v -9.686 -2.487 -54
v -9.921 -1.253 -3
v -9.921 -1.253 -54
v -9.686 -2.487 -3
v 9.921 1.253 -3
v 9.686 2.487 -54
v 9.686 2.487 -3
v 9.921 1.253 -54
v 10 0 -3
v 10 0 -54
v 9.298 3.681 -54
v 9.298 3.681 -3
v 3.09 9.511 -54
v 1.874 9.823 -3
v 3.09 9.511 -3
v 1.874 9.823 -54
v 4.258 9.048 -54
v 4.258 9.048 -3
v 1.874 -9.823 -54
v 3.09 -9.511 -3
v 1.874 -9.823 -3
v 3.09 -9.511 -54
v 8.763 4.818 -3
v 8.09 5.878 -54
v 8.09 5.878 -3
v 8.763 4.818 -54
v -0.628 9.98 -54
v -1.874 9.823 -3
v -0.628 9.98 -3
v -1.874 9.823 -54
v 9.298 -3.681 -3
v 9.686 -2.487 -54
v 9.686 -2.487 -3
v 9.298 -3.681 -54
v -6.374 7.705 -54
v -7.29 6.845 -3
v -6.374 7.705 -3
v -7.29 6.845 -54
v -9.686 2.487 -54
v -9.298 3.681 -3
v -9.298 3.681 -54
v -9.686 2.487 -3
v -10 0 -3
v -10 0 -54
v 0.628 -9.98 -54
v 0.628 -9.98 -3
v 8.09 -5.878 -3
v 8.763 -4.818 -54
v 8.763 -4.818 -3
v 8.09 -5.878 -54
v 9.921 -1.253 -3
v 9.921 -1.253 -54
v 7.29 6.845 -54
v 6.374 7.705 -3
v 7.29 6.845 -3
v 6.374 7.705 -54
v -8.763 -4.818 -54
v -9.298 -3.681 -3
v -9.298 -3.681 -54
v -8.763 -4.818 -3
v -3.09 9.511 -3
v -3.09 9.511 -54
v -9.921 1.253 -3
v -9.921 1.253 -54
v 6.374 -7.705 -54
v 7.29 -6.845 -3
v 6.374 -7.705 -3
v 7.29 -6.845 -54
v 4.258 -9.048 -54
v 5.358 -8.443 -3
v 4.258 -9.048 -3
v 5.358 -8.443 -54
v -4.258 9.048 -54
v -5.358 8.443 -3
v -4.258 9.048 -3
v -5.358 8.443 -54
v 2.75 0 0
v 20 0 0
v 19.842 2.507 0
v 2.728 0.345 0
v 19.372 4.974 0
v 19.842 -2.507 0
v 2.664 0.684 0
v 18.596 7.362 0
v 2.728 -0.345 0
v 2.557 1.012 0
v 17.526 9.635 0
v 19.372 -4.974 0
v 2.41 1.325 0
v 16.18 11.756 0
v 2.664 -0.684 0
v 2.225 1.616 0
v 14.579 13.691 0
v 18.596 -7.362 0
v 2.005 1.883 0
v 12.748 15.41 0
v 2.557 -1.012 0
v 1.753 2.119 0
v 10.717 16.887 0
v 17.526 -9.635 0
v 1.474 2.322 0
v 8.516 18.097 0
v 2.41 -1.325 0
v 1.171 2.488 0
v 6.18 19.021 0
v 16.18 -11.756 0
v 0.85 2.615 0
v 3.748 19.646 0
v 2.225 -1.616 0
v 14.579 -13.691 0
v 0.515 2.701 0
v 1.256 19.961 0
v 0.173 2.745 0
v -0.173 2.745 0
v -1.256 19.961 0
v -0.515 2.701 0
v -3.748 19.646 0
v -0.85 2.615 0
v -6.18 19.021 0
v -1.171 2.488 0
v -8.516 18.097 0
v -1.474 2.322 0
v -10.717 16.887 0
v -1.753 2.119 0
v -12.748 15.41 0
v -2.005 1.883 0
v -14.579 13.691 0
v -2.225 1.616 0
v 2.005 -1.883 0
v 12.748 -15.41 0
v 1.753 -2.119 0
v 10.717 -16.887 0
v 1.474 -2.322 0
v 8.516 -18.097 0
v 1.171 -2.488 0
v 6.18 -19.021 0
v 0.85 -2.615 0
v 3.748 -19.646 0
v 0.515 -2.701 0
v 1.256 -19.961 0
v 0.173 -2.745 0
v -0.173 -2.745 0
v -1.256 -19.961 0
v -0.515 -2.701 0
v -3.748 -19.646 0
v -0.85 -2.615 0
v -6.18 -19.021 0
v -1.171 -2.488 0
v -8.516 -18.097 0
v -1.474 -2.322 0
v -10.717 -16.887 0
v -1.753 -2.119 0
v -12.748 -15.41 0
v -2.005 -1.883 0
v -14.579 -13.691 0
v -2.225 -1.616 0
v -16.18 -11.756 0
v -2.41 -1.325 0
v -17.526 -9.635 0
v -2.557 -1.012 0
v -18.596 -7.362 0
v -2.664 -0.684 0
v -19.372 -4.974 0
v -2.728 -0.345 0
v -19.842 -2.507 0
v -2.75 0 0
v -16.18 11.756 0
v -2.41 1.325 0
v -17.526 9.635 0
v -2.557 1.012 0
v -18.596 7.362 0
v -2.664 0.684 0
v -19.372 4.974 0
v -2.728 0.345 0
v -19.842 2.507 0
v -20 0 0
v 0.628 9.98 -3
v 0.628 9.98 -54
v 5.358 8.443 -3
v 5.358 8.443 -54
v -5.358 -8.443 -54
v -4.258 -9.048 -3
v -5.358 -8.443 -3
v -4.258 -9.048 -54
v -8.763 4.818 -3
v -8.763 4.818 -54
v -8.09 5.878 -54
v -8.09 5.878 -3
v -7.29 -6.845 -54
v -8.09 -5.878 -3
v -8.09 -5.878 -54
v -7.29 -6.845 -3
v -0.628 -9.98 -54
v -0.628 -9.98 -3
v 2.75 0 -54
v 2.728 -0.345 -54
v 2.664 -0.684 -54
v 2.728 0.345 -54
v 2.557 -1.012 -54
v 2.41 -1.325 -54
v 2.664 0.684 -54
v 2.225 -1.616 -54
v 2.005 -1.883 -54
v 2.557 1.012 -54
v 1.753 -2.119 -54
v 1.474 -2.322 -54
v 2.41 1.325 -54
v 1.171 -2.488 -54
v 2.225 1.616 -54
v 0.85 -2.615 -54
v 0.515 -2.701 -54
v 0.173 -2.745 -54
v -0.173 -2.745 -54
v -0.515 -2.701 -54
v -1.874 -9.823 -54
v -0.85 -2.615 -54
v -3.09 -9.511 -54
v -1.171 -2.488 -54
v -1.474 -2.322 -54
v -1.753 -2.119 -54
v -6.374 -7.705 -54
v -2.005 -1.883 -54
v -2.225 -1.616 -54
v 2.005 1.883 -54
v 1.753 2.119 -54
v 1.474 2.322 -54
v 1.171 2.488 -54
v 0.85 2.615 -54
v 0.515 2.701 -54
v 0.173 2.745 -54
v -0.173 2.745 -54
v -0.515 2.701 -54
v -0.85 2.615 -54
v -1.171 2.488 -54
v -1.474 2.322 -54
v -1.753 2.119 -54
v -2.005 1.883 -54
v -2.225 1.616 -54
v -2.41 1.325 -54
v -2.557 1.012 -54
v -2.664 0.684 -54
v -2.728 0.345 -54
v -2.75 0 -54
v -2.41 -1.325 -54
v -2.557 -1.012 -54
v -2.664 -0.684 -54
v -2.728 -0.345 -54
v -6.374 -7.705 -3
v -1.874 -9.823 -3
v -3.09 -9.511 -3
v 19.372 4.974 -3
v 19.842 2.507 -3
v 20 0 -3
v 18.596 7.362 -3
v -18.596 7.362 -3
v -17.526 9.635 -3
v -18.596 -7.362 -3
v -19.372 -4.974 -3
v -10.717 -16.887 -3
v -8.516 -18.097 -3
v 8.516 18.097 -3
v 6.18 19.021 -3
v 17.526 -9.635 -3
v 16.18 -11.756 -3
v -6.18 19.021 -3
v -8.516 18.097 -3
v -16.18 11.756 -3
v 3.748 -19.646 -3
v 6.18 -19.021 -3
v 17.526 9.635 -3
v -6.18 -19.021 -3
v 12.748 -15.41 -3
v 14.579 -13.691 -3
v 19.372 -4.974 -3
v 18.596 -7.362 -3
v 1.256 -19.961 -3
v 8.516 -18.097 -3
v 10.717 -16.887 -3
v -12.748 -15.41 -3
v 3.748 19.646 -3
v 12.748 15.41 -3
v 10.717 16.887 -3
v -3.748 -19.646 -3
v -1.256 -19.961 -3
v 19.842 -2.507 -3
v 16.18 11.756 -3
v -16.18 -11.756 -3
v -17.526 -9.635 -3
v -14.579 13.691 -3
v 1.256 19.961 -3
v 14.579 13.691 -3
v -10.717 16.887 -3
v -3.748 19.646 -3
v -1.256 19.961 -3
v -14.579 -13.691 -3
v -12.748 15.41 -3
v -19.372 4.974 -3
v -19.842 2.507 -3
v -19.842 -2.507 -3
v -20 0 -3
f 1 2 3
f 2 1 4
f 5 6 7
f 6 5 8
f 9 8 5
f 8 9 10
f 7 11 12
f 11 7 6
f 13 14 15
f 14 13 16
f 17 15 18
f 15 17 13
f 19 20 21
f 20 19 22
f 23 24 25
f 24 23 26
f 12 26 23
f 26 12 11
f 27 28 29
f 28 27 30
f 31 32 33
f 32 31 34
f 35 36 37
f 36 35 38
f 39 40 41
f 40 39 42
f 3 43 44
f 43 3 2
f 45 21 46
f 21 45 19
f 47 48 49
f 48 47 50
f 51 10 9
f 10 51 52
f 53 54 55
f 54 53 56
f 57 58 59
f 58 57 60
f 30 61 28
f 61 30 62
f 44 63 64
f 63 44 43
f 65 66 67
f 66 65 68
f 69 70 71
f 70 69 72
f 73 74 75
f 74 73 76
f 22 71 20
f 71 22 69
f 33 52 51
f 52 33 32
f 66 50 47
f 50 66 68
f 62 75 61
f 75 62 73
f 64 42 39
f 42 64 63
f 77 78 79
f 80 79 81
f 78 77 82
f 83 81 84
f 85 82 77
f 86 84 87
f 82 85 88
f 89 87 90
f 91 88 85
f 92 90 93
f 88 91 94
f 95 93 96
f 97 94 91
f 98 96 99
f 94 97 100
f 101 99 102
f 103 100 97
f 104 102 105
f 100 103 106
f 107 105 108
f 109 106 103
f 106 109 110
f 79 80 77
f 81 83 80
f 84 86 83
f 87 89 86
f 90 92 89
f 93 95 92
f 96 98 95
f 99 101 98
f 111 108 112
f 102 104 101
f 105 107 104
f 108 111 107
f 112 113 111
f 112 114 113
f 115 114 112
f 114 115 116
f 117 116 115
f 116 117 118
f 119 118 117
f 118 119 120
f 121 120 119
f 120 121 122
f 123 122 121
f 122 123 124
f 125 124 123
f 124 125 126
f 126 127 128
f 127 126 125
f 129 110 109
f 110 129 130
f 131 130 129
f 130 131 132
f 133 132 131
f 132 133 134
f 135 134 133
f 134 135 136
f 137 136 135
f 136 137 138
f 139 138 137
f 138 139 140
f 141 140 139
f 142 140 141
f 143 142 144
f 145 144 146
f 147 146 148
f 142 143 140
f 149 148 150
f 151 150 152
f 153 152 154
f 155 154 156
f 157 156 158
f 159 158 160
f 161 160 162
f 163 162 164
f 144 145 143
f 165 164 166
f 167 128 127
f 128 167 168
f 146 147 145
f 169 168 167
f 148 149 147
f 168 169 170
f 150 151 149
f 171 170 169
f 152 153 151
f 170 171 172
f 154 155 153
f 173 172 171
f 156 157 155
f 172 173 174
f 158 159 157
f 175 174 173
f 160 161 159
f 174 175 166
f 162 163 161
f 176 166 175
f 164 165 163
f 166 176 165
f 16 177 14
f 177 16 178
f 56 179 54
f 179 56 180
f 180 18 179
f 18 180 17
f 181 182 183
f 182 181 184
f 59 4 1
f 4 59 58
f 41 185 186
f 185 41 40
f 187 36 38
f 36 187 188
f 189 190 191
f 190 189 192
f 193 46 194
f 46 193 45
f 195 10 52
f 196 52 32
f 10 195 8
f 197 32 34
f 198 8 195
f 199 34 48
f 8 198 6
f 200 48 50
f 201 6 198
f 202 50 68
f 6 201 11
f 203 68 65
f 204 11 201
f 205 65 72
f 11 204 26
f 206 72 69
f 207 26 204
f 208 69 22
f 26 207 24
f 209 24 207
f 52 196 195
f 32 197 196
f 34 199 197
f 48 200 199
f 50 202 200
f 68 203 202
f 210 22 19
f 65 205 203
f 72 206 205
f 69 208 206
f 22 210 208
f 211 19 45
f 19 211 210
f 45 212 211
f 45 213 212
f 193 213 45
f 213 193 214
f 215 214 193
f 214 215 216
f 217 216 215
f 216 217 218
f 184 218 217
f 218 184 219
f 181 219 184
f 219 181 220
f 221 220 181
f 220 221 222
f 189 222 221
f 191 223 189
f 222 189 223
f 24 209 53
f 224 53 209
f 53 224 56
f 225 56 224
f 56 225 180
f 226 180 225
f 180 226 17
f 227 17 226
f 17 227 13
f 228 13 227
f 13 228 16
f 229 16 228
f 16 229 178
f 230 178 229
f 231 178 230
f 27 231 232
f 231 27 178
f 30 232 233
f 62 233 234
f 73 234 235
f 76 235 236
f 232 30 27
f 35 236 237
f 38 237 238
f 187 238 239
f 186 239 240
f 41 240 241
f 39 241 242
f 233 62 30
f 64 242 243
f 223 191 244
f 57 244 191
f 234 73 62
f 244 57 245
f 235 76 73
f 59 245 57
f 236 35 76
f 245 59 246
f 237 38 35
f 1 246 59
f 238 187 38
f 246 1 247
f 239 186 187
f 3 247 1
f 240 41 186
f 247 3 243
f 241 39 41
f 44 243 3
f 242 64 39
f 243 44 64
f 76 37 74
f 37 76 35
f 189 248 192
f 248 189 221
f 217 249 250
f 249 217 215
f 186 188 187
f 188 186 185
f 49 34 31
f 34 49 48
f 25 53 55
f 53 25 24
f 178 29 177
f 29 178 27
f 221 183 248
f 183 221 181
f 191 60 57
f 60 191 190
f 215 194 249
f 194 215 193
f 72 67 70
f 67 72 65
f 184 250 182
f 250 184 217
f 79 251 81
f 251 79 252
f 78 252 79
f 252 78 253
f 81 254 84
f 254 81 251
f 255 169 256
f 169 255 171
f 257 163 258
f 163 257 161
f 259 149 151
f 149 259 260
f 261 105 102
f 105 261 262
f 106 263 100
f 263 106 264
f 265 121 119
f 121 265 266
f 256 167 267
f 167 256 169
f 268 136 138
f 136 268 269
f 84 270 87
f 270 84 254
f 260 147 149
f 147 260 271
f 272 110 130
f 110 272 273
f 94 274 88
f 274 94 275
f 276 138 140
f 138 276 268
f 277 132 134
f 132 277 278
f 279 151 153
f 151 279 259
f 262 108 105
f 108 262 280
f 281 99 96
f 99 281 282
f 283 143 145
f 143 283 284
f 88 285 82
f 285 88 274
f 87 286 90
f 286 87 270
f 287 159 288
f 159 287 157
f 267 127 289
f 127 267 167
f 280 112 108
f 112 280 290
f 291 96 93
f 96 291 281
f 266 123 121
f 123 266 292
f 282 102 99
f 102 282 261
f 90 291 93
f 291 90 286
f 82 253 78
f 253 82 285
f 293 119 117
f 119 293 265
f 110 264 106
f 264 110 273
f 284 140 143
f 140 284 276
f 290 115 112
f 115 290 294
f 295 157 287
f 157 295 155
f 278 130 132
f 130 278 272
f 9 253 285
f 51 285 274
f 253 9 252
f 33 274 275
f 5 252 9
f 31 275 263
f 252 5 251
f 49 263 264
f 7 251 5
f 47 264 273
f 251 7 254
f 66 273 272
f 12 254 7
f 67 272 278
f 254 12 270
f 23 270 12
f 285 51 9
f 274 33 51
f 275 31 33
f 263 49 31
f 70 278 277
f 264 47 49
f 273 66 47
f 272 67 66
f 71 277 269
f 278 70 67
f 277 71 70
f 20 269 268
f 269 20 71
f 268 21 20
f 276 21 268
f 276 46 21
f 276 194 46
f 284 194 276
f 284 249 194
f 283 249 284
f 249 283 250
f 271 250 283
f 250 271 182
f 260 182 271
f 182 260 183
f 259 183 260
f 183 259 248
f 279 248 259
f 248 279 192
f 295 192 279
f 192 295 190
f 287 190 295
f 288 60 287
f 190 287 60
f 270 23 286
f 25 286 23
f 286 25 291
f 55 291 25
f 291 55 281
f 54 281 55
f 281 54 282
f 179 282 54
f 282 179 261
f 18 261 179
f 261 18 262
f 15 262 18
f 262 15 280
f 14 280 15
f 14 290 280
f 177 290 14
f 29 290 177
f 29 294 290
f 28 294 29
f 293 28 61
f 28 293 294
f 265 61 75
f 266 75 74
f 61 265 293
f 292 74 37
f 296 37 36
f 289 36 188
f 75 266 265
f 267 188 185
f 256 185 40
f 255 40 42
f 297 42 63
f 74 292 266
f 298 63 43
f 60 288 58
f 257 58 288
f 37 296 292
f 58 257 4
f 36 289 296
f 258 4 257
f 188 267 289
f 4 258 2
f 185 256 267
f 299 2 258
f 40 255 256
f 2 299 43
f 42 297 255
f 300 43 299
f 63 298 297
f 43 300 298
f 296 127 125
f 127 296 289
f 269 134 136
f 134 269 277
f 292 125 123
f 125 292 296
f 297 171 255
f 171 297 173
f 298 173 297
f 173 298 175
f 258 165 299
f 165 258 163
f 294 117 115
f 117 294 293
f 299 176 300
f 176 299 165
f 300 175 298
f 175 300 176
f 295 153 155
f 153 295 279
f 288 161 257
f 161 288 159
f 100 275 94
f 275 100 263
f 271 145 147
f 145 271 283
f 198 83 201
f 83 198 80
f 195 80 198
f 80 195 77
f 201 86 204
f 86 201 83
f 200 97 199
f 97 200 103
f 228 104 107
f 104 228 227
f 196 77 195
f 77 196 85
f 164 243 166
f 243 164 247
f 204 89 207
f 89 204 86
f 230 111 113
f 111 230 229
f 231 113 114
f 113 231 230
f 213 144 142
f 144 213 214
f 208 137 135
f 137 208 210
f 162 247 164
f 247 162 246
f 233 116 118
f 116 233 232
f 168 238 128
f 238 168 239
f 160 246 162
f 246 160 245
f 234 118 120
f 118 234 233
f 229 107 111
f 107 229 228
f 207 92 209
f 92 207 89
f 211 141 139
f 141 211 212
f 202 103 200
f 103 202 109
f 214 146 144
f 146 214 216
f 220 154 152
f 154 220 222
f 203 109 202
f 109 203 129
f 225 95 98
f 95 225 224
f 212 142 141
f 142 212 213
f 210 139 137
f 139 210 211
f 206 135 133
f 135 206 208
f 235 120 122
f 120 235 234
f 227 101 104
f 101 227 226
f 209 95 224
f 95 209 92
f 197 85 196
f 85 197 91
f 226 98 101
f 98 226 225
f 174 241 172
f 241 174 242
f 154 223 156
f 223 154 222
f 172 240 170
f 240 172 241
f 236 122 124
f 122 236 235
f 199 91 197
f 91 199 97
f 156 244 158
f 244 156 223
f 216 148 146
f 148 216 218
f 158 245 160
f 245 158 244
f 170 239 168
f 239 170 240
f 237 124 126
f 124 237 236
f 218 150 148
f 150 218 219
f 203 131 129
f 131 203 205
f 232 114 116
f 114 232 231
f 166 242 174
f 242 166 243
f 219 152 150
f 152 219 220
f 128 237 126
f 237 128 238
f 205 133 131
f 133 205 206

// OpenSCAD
$fn = 50;


difference() {
	union() {
		translate(v = [0, 0, -54.0000000000]) {
			cylinder(h = 54, r = 10.0000000000);
		}
		translate(v = [0, 0, -3.0000000000]) {
			cylinder(h = 3, r = 20.0000000000);
		}
	}
	union() {
		#translate(v = [0, 0, -54]) {
			cylinder(h = 54, r = 2.7500000000);
		}
	}
}
